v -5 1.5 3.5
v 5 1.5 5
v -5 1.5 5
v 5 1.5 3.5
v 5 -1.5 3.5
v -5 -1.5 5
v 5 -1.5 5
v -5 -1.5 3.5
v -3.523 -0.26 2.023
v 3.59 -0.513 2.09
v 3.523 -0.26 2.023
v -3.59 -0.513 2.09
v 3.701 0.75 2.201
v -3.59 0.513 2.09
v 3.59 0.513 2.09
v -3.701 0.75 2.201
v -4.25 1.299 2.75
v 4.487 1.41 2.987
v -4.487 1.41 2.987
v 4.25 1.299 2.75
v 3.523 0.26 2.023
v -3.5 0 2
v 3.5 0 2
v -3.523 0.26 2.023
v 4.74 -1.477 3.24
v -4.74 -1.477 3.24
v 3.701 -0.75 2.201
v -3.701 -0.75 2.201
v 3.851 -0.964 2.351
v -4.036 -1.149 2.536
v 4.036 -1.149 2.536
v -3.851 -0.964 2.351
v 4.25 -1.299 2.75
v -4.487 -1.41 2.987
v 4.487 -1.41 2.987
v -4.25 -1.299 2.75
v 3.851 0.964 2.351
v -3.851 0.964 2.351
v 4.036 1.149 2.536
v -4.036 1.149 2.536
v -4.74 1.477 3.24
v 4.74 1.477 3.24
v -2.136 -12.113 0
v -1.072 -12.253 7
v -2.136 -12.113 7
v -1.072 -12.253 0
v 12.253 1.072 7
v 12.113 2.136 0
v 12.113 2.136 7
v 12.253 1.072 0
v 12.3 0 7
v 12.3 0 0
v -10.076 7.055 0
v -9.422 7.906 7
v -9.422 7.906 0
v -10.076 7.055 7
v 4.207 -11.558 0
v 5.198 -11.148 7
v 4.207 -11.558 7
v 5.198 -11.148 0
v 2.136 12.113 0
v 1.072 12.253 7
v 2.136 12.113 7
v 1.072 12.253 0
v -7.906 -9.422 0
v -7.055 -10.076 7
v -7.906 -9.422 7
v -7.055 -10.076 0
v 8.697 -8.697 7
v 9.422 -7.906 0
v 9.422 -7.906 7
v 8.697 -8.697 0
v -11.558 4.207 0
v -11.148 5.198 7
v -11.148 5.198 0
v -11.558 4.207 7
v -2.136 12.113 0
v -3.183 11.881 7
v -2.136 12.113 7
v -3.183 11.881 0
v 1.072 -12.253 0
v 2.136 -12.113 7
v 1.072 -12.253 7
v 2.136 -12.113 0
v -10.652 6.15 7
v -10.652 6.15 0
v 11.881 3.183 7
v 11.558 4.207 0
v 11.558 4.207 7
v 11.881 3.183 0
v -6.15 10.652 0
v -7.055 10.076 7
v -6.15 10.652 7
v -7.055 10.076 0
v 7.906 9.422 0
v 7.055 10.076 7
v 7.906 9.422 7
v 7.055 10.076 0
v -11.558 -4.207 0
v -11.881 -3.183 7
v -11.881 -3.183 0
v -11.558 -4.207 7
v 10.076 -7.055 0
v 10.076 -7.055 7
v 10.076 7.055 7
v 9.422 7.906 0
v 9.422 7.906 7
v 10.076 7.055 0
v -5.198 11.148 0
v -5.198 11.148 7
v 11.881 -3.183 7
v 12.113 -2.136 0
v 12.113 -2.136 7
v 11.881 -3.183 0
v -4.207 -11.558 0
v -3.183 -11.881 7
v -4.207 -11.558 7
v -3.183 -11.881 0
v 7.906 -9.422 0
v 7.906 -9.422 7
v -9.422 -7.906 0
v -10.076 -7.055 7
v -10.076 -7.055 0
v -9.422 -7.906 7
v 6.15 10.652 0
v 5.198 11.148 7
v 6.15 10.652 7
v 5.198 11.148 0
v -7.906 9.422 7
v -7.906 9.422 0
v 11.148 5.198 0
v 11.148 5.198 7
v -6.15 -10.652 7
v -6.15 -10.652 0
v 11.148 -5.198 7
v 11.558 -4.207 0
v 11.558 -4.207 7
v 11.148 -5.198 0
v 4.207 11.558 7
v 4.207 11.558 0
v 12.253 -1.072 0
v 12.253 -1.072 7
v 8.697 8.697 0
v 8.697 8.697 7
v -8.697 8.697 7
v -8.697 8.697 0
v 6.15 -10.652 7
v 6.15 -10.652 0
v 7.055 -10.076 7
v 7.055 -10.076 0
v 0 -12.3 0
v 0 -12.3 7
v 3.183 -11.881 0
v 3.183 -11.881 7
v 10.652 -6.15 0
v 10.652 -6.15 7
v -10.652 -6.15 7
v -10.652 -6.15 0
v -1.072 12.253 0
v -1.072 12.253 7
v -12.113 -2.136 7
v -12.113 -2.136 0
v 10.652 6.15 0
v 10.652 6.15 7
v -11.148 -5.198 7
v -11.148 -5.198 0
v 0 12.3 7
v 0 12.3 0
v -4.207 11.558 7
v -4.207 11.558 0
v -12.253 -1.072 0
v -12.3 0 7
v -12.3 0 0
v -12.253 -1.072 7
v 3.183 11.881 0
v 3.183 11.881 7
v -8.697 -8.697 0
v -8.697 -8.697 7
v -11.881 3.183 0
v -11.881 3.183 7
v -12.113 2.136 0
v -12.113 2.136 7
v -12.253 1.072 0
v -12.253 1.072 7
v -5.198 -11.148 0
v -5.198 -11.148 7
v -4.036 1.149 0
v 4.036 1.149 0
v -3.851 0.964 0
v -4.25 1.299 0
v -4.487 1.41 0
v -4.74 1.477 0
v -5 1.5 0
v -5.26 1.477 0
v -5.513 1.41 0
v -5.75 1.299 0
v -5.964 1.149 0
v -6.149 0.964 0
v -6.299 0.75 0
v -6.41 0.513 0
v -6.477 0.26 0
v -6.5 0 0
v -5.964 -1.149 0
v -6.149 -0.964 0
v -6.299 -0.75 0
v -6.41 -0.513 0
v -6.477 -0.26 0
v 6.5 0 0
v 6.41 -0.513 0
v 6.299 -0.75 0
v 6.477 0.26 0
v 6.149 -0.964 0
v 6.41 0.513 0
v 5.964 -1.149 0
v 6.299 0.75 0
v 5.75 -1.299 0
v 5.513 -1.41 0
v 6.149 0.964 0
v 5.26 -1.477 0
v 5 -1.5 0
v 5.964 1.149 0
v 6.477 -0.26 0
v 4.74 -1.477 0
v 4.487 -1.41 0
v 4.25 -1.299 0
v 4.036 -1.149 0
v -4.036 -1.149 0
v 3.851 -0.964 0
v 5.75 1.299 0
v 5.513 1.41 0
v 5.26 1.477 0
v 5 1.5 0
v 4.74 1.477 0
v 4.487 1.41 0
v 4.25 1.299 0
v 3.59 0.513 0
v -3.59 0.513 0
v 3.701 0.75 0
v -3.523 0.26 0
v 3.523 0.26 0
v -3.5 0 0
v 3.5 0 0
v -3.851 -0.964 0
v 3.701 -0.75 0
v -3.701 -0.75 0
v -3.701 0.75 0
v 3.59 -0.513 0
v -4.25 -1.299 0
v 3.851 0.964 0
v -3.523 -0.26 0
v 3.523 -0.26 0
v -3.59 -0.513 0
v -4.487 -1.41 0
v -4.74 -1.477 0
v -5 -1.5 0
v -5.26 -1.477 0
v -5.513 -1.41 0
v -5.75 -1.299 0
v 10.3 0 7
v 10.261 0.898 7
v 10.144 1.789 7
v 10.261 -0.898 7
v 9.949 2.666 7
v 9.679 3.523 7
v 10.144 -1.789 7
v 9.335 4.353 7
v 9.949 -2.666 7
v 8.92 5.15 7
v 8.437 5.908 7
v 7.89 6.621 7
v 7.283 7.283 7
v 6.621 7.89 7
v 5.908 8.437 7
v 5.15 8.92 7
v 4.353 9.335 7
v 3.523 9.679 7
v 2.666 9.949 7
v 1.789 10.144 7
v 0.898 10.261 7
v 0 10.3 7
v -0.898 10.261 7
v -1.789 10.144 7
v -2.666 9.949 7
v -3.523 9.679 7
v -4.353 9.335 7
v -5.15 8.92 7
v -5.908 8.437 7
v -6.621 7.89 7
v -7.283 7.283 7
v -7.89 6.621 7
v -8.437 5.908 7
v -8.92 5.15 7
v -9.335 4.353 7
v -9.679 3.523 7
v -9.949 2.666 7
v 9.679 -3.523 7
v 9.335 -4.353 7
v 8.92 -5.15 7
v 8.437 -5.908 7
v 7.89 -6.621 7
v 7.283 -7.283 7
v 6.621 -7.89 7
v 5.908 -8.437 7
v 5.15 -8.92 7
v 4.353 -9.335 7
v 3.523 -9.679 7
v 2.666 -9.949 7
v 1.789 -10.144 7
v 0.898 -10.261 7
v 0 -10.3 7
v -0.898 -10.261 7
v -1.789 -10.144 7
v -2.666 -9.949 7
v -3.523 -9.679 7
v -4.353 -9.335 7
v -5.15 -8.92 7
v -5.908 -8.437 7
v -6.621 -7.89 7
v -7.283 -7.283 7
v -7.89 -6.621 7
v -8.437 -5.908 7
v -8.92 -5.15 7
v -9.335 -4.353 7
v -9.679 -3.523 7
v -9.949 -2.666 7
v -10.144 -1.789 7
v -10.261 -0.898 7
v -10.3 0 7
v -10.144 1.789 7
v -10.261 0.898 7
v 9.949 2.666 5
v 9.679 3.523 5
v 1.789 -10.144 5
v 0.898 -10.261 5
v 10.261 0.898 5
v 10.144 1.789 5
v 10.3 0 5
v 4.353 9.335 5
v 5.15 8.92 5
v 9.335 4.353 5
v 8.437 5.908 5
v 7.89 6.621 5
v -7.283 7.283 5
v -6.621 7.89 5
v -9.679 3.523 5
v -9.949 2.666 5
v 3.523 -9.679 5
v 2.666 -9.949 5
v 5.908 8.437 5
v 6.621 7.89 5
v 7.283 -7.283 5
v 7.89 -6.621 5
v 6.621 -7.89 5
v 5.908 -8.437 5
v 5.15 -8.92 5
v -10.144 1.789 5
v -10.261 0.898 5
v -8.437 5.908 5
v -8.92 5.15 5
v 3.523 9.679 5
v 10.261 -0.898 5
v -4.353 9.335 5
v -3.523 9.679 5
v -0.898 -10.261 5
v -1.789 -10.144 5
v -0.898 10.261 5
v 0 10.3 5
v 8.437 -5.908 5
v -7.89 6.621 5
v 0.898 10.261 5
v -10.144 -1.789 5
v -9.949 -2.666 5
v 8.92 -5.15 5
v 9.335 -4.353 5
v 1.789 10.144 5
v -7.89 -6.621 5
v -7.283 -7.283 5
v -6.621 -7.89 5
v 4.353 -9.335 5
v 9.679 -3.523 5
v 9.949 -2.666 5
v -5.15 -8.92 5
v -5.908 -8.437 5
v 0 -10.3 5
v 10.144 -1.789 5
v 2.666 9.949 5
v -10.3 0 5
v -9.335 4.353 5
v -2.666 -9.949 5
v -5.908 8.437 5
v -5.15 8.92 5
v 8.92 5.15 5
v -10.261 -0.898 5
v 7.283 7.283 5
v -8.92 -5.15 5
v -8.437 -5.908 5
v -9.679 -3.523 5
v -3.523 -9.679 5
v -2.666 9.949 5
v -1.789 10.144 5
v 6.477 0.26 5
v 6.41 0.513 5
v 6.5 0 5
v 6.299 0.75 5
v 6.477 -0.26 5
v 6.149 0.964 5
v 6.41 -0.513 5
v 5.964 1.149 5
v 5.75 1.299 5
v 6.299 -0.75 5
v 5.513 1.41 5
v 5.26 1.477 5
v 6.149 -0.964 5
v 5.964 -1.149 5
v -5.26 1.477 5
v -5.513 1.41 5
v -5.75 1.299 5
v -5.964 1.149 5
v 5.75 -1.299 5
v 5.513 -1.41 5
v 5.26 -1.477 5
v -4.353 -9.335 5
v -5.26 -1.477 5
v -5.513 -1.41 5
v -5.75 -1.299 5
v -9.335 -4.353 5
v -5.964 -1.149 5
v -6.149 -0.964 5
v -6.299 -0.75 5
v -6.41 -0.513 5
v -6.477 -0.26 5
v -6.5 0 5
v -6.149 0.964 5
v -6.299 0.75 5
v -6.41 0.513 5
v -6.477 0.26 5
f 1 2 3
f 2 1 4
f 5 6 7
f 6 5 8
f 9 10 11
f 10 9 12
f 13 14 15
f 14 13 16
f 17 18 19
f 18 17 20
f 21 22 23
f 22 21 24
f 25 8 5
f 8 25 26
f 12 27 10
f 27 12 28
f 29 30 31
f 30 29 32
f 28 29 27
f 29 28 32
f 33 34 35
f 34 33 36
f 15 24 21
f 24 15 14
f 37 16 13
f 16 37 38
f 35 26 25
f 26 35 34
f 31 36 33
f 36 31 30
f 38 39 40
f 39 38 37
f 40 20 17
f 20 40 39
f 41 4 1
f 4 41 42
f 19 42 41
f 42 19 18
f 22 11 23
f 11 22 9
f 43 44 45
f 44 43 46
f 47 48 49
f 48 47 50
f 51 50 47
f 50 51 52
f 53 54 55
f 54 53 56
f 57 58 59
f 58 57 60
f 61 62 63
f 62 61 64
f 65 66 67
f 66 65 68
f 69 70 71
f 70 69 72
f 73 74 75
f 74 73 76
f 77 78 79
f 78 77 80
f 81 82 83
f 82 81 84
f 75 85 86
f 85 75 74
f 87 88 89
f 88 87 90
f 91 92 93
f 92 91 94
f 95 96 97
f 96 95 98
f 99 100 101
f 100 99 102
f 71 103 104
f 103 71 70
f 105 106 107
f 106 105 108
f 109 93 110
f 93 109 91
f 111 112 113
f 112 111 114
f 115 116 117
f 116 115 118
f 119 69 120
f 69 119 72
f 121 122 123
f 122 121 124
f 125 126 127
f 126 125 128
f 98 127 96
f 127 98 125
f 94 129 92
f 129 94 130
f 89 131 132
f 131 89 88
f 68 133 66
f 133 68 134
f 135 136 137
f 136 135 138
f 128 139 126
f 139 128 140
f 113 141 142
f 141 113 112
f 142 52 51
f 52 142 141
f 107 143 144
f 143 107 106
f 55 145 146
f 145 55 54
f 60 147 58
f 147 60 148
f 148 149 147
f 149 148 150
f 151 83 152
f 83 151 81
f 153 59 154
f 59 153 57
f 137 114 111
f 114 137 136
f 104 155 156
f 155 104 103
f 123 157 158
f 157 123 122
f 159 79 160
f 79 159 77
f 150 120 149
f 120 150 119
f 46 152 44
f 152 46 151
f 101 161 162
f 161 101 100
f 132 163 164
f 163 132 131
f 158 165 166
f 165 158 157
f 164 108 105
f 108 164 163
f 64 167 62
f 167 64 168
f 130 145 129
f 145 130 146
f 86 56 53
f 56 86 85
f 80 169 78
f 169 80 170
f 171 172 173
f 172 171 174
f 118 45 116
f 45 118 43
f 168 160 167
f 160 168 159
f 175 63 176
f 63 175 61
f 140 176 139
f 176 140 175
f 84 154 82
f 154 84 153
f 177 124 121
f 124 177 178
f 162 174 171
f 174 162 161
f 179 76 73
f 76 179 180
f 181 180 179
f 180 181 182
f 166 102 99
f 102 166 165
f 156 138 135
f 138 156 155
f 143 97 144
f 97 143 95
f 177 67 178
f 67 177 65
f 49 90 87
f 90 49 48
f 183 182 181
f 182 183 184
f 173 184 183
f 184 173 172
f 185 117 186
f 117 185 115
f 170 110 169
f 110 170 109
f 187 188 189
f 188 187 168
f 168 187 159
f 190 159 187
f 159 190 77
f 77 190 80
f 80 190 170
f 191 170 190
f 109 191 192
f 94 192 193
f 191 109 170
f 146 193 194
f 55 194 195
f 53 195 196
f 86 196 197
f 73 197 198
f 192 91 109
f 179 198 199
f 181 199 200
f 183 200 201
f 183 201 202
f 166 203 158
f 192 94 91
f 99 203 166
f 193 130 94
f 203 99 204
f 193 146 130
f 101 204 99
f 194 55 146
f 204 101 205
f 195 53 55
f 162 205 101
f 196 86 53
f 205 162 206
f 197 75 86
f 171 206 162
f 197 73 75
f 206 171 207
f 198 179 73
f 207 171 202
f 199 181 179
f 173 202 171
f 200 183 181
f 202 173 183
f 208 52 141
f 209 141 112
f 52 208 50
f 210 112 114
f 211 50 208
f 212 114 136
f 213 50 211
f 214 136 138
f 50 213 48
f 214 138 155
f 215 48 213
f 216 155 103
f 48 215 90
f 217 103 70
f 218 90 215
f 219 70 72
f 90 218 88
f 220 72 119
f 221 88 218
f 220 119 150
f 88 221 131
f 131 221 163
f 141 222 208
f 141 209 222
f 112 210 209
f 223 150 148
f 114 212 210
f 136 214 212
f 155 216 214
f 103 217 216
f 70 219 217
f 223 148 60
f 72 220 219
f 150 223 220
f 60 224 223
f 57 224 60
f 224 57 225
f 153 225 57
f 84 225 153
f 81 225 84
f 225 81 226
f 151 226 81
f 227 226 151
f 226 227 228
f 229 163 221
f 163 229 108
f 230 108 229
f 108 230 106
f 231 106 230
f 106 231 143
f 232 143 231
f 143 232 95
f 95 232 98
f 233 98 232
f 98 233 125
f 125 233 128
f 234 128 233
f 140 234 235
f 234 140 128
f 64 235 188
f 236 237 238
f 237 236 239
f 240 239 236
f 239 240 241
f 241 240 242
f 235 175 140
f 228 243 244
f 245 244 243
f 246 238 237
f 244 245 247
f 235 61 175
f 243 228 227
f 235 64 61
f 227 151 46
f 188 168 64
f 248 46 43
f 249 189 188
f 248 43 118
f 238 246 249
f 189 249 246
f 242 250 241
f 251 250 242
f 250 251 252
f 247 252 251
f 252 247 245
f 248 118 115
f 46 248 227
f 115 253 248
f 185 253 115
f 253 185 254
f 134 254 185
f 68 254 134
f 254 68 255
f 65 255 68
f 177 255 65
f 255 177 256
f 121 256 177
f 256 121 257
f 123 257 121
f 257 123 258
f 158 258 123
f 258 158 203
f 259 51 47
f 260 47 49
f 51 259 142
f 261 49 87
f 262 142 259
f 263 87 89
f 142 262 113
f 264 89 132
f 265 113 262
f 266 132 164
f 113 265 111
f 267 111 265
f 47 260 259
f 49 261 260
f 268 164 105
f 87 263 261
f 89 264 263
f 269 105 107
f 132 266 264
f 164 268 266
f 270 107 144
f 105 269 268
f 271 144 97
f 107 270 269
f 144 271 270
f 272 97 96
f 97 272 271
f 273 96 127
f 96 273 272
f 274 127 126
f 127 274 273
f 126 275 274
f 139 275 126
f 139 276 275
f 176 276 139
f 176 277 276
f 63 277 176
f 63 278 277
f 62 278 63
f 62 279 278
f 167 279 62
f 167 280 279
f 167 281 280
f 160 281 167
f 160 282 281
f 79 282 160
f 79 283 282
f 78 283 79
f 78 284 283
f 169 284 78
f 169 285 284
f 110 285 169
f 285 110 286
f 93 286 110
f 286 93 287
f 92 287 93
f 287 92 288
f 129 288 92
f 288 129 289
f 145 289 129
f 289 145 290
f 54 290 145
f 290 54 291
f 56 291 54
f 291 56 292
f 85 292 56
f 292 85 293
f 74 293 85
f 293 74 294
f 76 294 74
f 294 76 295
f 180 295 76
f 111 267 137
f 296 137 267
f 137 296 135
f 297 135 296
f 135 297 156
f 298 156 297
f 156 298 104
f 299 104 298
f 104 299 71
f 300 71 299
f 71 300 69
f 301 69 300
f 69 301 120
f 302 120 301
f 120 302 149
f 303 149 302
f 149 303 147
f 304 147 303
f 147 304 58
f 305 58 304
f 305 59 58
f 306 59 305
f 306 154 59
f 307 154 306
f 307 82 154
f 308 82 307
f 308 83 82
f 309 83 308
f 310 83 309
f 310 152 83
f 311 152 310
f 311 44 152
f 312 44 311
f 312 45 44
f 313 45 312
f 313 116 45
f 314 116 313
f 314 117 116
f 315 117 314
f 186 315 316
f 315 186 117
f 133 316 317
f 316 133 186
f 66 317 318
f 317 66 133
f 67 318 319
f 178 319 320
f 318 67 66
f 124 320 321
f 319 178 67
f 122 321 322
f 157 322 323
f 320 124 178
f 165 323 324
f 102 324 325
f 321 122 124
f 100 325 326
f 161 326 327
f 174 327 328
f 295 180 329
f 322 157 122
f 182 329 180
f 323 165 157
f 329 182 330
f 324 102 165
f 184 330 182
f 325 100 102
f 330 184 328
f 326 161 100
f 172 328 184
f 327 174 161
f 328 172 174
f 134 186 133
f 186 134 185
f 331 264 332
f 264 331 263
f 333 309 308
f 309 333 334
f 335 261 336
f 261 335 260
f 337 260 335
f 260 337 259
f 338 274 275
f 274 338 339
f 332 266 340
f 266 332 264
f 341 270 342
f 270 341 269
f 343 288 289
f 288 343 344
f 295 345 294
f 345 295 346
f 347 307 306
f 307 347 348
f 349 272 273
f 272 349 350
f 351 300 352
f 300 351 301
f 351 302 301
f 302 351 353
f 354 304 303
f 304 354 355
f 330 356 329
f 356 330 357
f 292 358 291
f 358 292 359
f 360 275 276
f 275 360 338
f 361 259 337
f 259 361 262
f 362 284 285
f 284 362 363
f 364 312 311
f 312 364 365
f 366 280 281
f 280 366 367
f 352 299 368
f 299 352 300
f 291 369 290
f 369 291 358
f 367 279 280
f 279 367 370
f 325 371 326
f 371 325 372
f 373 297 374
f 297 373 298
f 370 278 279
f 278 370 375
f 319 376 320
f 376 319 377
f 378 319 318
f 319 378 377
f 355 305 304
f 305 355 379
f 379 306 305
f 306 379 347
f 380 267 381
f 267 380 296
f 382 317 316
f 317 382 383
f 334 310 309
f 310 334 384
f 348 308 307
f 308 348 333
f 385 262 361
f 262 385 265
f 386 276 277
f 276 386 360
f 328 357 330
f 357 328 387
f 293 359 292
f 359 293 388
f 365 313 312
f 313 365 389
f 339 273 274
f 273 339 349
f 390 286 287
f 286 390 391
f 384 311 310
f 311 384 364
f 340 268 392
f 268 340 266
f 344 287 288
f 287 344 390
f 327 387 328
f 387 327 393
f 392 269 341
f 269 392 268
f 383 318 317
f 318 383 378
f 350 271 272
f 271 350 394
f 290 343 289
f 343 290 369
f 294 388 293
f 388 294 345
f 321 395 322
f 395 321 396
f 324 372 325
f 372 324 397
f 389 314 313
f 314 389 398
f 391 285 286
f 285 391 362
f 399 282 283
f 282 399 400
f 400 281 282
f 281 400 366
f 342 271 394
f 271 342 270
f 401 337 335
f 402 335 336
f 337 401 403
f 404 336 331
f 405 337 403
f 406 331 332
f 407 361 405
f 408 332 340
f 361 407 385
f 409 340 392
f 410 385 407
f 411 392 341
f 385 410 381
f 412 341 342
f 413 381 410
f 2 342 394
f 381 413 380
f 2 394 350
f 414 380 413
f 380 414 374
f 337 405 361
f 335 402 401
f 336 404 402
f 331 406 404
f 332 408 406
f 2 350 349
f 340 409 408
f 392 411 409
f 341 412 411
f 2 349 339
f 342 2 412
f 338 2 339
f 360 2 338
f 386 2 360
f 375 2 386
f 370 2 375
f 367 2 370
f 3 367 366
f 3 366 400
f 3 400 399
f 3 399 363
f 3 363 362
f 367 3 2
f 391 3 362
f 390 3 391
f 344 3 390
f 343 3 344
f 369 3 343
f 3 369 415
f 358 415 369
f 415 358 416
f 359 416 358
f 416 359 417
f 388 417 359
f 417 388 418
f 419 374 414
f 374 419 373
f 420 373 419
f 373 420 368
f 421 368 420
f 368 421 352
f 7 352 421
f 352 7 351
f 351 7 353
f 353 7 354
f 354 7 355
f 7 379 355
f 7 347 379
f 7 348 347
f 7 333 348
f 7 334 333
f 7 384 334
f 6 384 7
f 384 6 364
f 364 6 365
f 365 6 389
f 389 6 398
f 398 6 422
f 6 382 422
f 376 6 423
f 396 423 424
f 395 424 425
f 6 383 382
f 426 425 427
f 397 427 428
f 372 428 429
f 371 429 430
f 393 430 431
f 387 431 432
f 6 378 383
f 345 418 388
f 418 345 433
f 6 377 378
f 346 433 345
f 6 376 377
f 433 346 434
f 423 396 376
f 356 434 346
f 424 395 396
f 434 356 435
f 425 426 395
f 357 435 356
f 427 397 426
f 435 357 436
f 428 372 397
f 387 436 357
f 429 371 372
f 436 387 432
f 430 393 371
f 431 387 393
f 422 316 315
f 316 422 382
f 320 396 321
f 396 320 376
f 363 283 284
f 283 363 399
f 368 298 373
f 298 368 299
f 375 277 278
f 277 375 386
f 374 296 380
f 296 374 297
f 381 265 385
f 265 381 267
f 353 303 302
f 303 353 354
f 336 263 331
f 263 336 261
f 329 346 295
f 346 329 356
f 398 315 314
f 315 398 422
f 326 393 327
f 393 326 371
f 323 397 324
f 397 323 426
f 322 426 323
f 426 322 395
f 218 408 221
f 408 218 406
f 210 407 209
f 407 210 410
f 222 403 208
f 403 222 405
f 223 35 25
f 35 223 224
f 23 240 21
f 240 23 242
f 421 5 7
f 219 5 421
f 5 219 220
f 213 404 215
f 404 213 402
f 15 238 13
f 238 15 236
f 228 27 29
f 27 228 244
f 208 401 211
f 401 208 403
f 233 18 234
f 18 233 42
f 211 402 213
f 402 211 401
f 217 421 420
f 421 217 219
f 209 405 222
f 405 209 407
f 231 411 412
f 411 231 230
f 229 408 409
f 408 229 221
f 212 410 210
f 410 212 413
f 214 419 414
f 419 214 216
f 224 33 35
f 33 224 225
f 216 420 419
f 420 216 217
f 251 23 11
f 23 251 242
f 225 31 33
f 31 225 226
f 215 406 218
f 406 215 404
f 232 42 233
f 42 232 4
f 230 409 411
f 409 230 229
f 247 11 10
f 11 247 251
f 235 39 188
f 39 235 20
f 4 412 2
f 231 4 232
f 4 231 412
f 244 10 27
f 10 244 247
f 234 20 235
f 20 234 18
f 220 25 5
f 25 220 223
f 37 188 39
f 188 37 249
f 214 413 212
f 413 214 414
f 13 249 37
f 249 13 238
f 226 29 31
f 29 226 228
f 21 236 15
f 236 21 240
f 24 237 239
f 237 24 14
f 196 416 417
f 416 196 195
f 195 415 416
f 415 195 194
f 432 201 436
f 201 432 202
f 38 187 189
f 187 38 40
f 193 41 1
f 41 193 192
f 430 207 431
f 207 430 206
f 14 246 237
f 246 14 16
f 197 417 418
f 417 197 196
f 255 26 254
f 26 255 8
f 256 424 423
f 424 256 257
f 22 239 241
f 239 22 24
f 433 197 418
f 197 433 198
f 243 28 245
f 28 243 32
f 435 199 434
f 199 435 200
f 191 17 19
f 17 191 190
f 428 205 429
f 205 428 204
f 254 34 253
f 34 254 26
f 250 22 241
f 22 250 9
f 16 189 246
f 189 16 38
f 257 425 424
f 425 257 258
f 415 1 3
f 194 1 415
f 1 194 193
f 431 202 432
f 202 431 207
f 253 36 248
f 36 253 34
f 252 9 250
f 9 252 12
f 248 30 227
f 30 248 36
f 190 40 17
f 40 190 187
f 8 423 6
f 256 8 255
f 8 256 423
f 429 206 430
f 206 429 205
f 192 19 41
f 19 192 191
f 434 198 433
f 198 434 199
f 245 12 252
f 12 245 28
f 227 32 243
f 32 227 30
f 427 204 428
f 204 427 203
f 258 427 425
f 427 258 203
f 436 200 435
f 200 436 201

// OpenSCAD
tool_diameter = 24.6;         // [0.0:60.0]
tool_height = 7;              // [0.0:30.0]
magnet_diameter = 20.6;       // [0.0:60.0]
magnet_height = 2;            // [0.0:30.0]
wire_diameter = 3;            // [0.0:10.0]
distance_between_holes = 10;	// [0.0:60.0]

magnet_radius = magnet_diameter / 2;
tool_radius = tool_diameter / 2;
wire_radius = wire_diameter / 2;

difference()
{

  cylinder(h = tool_height, r = tool_radius, $fn=72);

  // magnet
  translate([0,0,tool_height-magnet_height])
  {
    cylinder(h = magnet_height + 0.01, r = magnet_radius, $fn=72);
  }

  // hole for left wire
  translate([distance_between_holes / 2, 0, -0.5])
  {
    cylinder(h = tool_height + 0.01, r = wire_radius, $fn=36);
  }

  // hole for right wire
  translate([- distance_between_holes / 2, 0, -0.5])
  {
    cylinder(h = tool_height + 0.1, r = wire_radius, $fn=36);
  }

  // space connecting left and right hole
  translate([-distance_between_holes/2, 0, tool_height-magnet_height-wire_radius])
  {
    translate([0, -wire_radius, 0])
    {
      cube(size = [distance_between_holes, wire_radius*2 , wire_radius+0.01]);
    }

    rotate([0,90,0])
    {
      cylinder(h = distance_between_holes, r = wire_radius, $fn=36);
    }
  }
}
